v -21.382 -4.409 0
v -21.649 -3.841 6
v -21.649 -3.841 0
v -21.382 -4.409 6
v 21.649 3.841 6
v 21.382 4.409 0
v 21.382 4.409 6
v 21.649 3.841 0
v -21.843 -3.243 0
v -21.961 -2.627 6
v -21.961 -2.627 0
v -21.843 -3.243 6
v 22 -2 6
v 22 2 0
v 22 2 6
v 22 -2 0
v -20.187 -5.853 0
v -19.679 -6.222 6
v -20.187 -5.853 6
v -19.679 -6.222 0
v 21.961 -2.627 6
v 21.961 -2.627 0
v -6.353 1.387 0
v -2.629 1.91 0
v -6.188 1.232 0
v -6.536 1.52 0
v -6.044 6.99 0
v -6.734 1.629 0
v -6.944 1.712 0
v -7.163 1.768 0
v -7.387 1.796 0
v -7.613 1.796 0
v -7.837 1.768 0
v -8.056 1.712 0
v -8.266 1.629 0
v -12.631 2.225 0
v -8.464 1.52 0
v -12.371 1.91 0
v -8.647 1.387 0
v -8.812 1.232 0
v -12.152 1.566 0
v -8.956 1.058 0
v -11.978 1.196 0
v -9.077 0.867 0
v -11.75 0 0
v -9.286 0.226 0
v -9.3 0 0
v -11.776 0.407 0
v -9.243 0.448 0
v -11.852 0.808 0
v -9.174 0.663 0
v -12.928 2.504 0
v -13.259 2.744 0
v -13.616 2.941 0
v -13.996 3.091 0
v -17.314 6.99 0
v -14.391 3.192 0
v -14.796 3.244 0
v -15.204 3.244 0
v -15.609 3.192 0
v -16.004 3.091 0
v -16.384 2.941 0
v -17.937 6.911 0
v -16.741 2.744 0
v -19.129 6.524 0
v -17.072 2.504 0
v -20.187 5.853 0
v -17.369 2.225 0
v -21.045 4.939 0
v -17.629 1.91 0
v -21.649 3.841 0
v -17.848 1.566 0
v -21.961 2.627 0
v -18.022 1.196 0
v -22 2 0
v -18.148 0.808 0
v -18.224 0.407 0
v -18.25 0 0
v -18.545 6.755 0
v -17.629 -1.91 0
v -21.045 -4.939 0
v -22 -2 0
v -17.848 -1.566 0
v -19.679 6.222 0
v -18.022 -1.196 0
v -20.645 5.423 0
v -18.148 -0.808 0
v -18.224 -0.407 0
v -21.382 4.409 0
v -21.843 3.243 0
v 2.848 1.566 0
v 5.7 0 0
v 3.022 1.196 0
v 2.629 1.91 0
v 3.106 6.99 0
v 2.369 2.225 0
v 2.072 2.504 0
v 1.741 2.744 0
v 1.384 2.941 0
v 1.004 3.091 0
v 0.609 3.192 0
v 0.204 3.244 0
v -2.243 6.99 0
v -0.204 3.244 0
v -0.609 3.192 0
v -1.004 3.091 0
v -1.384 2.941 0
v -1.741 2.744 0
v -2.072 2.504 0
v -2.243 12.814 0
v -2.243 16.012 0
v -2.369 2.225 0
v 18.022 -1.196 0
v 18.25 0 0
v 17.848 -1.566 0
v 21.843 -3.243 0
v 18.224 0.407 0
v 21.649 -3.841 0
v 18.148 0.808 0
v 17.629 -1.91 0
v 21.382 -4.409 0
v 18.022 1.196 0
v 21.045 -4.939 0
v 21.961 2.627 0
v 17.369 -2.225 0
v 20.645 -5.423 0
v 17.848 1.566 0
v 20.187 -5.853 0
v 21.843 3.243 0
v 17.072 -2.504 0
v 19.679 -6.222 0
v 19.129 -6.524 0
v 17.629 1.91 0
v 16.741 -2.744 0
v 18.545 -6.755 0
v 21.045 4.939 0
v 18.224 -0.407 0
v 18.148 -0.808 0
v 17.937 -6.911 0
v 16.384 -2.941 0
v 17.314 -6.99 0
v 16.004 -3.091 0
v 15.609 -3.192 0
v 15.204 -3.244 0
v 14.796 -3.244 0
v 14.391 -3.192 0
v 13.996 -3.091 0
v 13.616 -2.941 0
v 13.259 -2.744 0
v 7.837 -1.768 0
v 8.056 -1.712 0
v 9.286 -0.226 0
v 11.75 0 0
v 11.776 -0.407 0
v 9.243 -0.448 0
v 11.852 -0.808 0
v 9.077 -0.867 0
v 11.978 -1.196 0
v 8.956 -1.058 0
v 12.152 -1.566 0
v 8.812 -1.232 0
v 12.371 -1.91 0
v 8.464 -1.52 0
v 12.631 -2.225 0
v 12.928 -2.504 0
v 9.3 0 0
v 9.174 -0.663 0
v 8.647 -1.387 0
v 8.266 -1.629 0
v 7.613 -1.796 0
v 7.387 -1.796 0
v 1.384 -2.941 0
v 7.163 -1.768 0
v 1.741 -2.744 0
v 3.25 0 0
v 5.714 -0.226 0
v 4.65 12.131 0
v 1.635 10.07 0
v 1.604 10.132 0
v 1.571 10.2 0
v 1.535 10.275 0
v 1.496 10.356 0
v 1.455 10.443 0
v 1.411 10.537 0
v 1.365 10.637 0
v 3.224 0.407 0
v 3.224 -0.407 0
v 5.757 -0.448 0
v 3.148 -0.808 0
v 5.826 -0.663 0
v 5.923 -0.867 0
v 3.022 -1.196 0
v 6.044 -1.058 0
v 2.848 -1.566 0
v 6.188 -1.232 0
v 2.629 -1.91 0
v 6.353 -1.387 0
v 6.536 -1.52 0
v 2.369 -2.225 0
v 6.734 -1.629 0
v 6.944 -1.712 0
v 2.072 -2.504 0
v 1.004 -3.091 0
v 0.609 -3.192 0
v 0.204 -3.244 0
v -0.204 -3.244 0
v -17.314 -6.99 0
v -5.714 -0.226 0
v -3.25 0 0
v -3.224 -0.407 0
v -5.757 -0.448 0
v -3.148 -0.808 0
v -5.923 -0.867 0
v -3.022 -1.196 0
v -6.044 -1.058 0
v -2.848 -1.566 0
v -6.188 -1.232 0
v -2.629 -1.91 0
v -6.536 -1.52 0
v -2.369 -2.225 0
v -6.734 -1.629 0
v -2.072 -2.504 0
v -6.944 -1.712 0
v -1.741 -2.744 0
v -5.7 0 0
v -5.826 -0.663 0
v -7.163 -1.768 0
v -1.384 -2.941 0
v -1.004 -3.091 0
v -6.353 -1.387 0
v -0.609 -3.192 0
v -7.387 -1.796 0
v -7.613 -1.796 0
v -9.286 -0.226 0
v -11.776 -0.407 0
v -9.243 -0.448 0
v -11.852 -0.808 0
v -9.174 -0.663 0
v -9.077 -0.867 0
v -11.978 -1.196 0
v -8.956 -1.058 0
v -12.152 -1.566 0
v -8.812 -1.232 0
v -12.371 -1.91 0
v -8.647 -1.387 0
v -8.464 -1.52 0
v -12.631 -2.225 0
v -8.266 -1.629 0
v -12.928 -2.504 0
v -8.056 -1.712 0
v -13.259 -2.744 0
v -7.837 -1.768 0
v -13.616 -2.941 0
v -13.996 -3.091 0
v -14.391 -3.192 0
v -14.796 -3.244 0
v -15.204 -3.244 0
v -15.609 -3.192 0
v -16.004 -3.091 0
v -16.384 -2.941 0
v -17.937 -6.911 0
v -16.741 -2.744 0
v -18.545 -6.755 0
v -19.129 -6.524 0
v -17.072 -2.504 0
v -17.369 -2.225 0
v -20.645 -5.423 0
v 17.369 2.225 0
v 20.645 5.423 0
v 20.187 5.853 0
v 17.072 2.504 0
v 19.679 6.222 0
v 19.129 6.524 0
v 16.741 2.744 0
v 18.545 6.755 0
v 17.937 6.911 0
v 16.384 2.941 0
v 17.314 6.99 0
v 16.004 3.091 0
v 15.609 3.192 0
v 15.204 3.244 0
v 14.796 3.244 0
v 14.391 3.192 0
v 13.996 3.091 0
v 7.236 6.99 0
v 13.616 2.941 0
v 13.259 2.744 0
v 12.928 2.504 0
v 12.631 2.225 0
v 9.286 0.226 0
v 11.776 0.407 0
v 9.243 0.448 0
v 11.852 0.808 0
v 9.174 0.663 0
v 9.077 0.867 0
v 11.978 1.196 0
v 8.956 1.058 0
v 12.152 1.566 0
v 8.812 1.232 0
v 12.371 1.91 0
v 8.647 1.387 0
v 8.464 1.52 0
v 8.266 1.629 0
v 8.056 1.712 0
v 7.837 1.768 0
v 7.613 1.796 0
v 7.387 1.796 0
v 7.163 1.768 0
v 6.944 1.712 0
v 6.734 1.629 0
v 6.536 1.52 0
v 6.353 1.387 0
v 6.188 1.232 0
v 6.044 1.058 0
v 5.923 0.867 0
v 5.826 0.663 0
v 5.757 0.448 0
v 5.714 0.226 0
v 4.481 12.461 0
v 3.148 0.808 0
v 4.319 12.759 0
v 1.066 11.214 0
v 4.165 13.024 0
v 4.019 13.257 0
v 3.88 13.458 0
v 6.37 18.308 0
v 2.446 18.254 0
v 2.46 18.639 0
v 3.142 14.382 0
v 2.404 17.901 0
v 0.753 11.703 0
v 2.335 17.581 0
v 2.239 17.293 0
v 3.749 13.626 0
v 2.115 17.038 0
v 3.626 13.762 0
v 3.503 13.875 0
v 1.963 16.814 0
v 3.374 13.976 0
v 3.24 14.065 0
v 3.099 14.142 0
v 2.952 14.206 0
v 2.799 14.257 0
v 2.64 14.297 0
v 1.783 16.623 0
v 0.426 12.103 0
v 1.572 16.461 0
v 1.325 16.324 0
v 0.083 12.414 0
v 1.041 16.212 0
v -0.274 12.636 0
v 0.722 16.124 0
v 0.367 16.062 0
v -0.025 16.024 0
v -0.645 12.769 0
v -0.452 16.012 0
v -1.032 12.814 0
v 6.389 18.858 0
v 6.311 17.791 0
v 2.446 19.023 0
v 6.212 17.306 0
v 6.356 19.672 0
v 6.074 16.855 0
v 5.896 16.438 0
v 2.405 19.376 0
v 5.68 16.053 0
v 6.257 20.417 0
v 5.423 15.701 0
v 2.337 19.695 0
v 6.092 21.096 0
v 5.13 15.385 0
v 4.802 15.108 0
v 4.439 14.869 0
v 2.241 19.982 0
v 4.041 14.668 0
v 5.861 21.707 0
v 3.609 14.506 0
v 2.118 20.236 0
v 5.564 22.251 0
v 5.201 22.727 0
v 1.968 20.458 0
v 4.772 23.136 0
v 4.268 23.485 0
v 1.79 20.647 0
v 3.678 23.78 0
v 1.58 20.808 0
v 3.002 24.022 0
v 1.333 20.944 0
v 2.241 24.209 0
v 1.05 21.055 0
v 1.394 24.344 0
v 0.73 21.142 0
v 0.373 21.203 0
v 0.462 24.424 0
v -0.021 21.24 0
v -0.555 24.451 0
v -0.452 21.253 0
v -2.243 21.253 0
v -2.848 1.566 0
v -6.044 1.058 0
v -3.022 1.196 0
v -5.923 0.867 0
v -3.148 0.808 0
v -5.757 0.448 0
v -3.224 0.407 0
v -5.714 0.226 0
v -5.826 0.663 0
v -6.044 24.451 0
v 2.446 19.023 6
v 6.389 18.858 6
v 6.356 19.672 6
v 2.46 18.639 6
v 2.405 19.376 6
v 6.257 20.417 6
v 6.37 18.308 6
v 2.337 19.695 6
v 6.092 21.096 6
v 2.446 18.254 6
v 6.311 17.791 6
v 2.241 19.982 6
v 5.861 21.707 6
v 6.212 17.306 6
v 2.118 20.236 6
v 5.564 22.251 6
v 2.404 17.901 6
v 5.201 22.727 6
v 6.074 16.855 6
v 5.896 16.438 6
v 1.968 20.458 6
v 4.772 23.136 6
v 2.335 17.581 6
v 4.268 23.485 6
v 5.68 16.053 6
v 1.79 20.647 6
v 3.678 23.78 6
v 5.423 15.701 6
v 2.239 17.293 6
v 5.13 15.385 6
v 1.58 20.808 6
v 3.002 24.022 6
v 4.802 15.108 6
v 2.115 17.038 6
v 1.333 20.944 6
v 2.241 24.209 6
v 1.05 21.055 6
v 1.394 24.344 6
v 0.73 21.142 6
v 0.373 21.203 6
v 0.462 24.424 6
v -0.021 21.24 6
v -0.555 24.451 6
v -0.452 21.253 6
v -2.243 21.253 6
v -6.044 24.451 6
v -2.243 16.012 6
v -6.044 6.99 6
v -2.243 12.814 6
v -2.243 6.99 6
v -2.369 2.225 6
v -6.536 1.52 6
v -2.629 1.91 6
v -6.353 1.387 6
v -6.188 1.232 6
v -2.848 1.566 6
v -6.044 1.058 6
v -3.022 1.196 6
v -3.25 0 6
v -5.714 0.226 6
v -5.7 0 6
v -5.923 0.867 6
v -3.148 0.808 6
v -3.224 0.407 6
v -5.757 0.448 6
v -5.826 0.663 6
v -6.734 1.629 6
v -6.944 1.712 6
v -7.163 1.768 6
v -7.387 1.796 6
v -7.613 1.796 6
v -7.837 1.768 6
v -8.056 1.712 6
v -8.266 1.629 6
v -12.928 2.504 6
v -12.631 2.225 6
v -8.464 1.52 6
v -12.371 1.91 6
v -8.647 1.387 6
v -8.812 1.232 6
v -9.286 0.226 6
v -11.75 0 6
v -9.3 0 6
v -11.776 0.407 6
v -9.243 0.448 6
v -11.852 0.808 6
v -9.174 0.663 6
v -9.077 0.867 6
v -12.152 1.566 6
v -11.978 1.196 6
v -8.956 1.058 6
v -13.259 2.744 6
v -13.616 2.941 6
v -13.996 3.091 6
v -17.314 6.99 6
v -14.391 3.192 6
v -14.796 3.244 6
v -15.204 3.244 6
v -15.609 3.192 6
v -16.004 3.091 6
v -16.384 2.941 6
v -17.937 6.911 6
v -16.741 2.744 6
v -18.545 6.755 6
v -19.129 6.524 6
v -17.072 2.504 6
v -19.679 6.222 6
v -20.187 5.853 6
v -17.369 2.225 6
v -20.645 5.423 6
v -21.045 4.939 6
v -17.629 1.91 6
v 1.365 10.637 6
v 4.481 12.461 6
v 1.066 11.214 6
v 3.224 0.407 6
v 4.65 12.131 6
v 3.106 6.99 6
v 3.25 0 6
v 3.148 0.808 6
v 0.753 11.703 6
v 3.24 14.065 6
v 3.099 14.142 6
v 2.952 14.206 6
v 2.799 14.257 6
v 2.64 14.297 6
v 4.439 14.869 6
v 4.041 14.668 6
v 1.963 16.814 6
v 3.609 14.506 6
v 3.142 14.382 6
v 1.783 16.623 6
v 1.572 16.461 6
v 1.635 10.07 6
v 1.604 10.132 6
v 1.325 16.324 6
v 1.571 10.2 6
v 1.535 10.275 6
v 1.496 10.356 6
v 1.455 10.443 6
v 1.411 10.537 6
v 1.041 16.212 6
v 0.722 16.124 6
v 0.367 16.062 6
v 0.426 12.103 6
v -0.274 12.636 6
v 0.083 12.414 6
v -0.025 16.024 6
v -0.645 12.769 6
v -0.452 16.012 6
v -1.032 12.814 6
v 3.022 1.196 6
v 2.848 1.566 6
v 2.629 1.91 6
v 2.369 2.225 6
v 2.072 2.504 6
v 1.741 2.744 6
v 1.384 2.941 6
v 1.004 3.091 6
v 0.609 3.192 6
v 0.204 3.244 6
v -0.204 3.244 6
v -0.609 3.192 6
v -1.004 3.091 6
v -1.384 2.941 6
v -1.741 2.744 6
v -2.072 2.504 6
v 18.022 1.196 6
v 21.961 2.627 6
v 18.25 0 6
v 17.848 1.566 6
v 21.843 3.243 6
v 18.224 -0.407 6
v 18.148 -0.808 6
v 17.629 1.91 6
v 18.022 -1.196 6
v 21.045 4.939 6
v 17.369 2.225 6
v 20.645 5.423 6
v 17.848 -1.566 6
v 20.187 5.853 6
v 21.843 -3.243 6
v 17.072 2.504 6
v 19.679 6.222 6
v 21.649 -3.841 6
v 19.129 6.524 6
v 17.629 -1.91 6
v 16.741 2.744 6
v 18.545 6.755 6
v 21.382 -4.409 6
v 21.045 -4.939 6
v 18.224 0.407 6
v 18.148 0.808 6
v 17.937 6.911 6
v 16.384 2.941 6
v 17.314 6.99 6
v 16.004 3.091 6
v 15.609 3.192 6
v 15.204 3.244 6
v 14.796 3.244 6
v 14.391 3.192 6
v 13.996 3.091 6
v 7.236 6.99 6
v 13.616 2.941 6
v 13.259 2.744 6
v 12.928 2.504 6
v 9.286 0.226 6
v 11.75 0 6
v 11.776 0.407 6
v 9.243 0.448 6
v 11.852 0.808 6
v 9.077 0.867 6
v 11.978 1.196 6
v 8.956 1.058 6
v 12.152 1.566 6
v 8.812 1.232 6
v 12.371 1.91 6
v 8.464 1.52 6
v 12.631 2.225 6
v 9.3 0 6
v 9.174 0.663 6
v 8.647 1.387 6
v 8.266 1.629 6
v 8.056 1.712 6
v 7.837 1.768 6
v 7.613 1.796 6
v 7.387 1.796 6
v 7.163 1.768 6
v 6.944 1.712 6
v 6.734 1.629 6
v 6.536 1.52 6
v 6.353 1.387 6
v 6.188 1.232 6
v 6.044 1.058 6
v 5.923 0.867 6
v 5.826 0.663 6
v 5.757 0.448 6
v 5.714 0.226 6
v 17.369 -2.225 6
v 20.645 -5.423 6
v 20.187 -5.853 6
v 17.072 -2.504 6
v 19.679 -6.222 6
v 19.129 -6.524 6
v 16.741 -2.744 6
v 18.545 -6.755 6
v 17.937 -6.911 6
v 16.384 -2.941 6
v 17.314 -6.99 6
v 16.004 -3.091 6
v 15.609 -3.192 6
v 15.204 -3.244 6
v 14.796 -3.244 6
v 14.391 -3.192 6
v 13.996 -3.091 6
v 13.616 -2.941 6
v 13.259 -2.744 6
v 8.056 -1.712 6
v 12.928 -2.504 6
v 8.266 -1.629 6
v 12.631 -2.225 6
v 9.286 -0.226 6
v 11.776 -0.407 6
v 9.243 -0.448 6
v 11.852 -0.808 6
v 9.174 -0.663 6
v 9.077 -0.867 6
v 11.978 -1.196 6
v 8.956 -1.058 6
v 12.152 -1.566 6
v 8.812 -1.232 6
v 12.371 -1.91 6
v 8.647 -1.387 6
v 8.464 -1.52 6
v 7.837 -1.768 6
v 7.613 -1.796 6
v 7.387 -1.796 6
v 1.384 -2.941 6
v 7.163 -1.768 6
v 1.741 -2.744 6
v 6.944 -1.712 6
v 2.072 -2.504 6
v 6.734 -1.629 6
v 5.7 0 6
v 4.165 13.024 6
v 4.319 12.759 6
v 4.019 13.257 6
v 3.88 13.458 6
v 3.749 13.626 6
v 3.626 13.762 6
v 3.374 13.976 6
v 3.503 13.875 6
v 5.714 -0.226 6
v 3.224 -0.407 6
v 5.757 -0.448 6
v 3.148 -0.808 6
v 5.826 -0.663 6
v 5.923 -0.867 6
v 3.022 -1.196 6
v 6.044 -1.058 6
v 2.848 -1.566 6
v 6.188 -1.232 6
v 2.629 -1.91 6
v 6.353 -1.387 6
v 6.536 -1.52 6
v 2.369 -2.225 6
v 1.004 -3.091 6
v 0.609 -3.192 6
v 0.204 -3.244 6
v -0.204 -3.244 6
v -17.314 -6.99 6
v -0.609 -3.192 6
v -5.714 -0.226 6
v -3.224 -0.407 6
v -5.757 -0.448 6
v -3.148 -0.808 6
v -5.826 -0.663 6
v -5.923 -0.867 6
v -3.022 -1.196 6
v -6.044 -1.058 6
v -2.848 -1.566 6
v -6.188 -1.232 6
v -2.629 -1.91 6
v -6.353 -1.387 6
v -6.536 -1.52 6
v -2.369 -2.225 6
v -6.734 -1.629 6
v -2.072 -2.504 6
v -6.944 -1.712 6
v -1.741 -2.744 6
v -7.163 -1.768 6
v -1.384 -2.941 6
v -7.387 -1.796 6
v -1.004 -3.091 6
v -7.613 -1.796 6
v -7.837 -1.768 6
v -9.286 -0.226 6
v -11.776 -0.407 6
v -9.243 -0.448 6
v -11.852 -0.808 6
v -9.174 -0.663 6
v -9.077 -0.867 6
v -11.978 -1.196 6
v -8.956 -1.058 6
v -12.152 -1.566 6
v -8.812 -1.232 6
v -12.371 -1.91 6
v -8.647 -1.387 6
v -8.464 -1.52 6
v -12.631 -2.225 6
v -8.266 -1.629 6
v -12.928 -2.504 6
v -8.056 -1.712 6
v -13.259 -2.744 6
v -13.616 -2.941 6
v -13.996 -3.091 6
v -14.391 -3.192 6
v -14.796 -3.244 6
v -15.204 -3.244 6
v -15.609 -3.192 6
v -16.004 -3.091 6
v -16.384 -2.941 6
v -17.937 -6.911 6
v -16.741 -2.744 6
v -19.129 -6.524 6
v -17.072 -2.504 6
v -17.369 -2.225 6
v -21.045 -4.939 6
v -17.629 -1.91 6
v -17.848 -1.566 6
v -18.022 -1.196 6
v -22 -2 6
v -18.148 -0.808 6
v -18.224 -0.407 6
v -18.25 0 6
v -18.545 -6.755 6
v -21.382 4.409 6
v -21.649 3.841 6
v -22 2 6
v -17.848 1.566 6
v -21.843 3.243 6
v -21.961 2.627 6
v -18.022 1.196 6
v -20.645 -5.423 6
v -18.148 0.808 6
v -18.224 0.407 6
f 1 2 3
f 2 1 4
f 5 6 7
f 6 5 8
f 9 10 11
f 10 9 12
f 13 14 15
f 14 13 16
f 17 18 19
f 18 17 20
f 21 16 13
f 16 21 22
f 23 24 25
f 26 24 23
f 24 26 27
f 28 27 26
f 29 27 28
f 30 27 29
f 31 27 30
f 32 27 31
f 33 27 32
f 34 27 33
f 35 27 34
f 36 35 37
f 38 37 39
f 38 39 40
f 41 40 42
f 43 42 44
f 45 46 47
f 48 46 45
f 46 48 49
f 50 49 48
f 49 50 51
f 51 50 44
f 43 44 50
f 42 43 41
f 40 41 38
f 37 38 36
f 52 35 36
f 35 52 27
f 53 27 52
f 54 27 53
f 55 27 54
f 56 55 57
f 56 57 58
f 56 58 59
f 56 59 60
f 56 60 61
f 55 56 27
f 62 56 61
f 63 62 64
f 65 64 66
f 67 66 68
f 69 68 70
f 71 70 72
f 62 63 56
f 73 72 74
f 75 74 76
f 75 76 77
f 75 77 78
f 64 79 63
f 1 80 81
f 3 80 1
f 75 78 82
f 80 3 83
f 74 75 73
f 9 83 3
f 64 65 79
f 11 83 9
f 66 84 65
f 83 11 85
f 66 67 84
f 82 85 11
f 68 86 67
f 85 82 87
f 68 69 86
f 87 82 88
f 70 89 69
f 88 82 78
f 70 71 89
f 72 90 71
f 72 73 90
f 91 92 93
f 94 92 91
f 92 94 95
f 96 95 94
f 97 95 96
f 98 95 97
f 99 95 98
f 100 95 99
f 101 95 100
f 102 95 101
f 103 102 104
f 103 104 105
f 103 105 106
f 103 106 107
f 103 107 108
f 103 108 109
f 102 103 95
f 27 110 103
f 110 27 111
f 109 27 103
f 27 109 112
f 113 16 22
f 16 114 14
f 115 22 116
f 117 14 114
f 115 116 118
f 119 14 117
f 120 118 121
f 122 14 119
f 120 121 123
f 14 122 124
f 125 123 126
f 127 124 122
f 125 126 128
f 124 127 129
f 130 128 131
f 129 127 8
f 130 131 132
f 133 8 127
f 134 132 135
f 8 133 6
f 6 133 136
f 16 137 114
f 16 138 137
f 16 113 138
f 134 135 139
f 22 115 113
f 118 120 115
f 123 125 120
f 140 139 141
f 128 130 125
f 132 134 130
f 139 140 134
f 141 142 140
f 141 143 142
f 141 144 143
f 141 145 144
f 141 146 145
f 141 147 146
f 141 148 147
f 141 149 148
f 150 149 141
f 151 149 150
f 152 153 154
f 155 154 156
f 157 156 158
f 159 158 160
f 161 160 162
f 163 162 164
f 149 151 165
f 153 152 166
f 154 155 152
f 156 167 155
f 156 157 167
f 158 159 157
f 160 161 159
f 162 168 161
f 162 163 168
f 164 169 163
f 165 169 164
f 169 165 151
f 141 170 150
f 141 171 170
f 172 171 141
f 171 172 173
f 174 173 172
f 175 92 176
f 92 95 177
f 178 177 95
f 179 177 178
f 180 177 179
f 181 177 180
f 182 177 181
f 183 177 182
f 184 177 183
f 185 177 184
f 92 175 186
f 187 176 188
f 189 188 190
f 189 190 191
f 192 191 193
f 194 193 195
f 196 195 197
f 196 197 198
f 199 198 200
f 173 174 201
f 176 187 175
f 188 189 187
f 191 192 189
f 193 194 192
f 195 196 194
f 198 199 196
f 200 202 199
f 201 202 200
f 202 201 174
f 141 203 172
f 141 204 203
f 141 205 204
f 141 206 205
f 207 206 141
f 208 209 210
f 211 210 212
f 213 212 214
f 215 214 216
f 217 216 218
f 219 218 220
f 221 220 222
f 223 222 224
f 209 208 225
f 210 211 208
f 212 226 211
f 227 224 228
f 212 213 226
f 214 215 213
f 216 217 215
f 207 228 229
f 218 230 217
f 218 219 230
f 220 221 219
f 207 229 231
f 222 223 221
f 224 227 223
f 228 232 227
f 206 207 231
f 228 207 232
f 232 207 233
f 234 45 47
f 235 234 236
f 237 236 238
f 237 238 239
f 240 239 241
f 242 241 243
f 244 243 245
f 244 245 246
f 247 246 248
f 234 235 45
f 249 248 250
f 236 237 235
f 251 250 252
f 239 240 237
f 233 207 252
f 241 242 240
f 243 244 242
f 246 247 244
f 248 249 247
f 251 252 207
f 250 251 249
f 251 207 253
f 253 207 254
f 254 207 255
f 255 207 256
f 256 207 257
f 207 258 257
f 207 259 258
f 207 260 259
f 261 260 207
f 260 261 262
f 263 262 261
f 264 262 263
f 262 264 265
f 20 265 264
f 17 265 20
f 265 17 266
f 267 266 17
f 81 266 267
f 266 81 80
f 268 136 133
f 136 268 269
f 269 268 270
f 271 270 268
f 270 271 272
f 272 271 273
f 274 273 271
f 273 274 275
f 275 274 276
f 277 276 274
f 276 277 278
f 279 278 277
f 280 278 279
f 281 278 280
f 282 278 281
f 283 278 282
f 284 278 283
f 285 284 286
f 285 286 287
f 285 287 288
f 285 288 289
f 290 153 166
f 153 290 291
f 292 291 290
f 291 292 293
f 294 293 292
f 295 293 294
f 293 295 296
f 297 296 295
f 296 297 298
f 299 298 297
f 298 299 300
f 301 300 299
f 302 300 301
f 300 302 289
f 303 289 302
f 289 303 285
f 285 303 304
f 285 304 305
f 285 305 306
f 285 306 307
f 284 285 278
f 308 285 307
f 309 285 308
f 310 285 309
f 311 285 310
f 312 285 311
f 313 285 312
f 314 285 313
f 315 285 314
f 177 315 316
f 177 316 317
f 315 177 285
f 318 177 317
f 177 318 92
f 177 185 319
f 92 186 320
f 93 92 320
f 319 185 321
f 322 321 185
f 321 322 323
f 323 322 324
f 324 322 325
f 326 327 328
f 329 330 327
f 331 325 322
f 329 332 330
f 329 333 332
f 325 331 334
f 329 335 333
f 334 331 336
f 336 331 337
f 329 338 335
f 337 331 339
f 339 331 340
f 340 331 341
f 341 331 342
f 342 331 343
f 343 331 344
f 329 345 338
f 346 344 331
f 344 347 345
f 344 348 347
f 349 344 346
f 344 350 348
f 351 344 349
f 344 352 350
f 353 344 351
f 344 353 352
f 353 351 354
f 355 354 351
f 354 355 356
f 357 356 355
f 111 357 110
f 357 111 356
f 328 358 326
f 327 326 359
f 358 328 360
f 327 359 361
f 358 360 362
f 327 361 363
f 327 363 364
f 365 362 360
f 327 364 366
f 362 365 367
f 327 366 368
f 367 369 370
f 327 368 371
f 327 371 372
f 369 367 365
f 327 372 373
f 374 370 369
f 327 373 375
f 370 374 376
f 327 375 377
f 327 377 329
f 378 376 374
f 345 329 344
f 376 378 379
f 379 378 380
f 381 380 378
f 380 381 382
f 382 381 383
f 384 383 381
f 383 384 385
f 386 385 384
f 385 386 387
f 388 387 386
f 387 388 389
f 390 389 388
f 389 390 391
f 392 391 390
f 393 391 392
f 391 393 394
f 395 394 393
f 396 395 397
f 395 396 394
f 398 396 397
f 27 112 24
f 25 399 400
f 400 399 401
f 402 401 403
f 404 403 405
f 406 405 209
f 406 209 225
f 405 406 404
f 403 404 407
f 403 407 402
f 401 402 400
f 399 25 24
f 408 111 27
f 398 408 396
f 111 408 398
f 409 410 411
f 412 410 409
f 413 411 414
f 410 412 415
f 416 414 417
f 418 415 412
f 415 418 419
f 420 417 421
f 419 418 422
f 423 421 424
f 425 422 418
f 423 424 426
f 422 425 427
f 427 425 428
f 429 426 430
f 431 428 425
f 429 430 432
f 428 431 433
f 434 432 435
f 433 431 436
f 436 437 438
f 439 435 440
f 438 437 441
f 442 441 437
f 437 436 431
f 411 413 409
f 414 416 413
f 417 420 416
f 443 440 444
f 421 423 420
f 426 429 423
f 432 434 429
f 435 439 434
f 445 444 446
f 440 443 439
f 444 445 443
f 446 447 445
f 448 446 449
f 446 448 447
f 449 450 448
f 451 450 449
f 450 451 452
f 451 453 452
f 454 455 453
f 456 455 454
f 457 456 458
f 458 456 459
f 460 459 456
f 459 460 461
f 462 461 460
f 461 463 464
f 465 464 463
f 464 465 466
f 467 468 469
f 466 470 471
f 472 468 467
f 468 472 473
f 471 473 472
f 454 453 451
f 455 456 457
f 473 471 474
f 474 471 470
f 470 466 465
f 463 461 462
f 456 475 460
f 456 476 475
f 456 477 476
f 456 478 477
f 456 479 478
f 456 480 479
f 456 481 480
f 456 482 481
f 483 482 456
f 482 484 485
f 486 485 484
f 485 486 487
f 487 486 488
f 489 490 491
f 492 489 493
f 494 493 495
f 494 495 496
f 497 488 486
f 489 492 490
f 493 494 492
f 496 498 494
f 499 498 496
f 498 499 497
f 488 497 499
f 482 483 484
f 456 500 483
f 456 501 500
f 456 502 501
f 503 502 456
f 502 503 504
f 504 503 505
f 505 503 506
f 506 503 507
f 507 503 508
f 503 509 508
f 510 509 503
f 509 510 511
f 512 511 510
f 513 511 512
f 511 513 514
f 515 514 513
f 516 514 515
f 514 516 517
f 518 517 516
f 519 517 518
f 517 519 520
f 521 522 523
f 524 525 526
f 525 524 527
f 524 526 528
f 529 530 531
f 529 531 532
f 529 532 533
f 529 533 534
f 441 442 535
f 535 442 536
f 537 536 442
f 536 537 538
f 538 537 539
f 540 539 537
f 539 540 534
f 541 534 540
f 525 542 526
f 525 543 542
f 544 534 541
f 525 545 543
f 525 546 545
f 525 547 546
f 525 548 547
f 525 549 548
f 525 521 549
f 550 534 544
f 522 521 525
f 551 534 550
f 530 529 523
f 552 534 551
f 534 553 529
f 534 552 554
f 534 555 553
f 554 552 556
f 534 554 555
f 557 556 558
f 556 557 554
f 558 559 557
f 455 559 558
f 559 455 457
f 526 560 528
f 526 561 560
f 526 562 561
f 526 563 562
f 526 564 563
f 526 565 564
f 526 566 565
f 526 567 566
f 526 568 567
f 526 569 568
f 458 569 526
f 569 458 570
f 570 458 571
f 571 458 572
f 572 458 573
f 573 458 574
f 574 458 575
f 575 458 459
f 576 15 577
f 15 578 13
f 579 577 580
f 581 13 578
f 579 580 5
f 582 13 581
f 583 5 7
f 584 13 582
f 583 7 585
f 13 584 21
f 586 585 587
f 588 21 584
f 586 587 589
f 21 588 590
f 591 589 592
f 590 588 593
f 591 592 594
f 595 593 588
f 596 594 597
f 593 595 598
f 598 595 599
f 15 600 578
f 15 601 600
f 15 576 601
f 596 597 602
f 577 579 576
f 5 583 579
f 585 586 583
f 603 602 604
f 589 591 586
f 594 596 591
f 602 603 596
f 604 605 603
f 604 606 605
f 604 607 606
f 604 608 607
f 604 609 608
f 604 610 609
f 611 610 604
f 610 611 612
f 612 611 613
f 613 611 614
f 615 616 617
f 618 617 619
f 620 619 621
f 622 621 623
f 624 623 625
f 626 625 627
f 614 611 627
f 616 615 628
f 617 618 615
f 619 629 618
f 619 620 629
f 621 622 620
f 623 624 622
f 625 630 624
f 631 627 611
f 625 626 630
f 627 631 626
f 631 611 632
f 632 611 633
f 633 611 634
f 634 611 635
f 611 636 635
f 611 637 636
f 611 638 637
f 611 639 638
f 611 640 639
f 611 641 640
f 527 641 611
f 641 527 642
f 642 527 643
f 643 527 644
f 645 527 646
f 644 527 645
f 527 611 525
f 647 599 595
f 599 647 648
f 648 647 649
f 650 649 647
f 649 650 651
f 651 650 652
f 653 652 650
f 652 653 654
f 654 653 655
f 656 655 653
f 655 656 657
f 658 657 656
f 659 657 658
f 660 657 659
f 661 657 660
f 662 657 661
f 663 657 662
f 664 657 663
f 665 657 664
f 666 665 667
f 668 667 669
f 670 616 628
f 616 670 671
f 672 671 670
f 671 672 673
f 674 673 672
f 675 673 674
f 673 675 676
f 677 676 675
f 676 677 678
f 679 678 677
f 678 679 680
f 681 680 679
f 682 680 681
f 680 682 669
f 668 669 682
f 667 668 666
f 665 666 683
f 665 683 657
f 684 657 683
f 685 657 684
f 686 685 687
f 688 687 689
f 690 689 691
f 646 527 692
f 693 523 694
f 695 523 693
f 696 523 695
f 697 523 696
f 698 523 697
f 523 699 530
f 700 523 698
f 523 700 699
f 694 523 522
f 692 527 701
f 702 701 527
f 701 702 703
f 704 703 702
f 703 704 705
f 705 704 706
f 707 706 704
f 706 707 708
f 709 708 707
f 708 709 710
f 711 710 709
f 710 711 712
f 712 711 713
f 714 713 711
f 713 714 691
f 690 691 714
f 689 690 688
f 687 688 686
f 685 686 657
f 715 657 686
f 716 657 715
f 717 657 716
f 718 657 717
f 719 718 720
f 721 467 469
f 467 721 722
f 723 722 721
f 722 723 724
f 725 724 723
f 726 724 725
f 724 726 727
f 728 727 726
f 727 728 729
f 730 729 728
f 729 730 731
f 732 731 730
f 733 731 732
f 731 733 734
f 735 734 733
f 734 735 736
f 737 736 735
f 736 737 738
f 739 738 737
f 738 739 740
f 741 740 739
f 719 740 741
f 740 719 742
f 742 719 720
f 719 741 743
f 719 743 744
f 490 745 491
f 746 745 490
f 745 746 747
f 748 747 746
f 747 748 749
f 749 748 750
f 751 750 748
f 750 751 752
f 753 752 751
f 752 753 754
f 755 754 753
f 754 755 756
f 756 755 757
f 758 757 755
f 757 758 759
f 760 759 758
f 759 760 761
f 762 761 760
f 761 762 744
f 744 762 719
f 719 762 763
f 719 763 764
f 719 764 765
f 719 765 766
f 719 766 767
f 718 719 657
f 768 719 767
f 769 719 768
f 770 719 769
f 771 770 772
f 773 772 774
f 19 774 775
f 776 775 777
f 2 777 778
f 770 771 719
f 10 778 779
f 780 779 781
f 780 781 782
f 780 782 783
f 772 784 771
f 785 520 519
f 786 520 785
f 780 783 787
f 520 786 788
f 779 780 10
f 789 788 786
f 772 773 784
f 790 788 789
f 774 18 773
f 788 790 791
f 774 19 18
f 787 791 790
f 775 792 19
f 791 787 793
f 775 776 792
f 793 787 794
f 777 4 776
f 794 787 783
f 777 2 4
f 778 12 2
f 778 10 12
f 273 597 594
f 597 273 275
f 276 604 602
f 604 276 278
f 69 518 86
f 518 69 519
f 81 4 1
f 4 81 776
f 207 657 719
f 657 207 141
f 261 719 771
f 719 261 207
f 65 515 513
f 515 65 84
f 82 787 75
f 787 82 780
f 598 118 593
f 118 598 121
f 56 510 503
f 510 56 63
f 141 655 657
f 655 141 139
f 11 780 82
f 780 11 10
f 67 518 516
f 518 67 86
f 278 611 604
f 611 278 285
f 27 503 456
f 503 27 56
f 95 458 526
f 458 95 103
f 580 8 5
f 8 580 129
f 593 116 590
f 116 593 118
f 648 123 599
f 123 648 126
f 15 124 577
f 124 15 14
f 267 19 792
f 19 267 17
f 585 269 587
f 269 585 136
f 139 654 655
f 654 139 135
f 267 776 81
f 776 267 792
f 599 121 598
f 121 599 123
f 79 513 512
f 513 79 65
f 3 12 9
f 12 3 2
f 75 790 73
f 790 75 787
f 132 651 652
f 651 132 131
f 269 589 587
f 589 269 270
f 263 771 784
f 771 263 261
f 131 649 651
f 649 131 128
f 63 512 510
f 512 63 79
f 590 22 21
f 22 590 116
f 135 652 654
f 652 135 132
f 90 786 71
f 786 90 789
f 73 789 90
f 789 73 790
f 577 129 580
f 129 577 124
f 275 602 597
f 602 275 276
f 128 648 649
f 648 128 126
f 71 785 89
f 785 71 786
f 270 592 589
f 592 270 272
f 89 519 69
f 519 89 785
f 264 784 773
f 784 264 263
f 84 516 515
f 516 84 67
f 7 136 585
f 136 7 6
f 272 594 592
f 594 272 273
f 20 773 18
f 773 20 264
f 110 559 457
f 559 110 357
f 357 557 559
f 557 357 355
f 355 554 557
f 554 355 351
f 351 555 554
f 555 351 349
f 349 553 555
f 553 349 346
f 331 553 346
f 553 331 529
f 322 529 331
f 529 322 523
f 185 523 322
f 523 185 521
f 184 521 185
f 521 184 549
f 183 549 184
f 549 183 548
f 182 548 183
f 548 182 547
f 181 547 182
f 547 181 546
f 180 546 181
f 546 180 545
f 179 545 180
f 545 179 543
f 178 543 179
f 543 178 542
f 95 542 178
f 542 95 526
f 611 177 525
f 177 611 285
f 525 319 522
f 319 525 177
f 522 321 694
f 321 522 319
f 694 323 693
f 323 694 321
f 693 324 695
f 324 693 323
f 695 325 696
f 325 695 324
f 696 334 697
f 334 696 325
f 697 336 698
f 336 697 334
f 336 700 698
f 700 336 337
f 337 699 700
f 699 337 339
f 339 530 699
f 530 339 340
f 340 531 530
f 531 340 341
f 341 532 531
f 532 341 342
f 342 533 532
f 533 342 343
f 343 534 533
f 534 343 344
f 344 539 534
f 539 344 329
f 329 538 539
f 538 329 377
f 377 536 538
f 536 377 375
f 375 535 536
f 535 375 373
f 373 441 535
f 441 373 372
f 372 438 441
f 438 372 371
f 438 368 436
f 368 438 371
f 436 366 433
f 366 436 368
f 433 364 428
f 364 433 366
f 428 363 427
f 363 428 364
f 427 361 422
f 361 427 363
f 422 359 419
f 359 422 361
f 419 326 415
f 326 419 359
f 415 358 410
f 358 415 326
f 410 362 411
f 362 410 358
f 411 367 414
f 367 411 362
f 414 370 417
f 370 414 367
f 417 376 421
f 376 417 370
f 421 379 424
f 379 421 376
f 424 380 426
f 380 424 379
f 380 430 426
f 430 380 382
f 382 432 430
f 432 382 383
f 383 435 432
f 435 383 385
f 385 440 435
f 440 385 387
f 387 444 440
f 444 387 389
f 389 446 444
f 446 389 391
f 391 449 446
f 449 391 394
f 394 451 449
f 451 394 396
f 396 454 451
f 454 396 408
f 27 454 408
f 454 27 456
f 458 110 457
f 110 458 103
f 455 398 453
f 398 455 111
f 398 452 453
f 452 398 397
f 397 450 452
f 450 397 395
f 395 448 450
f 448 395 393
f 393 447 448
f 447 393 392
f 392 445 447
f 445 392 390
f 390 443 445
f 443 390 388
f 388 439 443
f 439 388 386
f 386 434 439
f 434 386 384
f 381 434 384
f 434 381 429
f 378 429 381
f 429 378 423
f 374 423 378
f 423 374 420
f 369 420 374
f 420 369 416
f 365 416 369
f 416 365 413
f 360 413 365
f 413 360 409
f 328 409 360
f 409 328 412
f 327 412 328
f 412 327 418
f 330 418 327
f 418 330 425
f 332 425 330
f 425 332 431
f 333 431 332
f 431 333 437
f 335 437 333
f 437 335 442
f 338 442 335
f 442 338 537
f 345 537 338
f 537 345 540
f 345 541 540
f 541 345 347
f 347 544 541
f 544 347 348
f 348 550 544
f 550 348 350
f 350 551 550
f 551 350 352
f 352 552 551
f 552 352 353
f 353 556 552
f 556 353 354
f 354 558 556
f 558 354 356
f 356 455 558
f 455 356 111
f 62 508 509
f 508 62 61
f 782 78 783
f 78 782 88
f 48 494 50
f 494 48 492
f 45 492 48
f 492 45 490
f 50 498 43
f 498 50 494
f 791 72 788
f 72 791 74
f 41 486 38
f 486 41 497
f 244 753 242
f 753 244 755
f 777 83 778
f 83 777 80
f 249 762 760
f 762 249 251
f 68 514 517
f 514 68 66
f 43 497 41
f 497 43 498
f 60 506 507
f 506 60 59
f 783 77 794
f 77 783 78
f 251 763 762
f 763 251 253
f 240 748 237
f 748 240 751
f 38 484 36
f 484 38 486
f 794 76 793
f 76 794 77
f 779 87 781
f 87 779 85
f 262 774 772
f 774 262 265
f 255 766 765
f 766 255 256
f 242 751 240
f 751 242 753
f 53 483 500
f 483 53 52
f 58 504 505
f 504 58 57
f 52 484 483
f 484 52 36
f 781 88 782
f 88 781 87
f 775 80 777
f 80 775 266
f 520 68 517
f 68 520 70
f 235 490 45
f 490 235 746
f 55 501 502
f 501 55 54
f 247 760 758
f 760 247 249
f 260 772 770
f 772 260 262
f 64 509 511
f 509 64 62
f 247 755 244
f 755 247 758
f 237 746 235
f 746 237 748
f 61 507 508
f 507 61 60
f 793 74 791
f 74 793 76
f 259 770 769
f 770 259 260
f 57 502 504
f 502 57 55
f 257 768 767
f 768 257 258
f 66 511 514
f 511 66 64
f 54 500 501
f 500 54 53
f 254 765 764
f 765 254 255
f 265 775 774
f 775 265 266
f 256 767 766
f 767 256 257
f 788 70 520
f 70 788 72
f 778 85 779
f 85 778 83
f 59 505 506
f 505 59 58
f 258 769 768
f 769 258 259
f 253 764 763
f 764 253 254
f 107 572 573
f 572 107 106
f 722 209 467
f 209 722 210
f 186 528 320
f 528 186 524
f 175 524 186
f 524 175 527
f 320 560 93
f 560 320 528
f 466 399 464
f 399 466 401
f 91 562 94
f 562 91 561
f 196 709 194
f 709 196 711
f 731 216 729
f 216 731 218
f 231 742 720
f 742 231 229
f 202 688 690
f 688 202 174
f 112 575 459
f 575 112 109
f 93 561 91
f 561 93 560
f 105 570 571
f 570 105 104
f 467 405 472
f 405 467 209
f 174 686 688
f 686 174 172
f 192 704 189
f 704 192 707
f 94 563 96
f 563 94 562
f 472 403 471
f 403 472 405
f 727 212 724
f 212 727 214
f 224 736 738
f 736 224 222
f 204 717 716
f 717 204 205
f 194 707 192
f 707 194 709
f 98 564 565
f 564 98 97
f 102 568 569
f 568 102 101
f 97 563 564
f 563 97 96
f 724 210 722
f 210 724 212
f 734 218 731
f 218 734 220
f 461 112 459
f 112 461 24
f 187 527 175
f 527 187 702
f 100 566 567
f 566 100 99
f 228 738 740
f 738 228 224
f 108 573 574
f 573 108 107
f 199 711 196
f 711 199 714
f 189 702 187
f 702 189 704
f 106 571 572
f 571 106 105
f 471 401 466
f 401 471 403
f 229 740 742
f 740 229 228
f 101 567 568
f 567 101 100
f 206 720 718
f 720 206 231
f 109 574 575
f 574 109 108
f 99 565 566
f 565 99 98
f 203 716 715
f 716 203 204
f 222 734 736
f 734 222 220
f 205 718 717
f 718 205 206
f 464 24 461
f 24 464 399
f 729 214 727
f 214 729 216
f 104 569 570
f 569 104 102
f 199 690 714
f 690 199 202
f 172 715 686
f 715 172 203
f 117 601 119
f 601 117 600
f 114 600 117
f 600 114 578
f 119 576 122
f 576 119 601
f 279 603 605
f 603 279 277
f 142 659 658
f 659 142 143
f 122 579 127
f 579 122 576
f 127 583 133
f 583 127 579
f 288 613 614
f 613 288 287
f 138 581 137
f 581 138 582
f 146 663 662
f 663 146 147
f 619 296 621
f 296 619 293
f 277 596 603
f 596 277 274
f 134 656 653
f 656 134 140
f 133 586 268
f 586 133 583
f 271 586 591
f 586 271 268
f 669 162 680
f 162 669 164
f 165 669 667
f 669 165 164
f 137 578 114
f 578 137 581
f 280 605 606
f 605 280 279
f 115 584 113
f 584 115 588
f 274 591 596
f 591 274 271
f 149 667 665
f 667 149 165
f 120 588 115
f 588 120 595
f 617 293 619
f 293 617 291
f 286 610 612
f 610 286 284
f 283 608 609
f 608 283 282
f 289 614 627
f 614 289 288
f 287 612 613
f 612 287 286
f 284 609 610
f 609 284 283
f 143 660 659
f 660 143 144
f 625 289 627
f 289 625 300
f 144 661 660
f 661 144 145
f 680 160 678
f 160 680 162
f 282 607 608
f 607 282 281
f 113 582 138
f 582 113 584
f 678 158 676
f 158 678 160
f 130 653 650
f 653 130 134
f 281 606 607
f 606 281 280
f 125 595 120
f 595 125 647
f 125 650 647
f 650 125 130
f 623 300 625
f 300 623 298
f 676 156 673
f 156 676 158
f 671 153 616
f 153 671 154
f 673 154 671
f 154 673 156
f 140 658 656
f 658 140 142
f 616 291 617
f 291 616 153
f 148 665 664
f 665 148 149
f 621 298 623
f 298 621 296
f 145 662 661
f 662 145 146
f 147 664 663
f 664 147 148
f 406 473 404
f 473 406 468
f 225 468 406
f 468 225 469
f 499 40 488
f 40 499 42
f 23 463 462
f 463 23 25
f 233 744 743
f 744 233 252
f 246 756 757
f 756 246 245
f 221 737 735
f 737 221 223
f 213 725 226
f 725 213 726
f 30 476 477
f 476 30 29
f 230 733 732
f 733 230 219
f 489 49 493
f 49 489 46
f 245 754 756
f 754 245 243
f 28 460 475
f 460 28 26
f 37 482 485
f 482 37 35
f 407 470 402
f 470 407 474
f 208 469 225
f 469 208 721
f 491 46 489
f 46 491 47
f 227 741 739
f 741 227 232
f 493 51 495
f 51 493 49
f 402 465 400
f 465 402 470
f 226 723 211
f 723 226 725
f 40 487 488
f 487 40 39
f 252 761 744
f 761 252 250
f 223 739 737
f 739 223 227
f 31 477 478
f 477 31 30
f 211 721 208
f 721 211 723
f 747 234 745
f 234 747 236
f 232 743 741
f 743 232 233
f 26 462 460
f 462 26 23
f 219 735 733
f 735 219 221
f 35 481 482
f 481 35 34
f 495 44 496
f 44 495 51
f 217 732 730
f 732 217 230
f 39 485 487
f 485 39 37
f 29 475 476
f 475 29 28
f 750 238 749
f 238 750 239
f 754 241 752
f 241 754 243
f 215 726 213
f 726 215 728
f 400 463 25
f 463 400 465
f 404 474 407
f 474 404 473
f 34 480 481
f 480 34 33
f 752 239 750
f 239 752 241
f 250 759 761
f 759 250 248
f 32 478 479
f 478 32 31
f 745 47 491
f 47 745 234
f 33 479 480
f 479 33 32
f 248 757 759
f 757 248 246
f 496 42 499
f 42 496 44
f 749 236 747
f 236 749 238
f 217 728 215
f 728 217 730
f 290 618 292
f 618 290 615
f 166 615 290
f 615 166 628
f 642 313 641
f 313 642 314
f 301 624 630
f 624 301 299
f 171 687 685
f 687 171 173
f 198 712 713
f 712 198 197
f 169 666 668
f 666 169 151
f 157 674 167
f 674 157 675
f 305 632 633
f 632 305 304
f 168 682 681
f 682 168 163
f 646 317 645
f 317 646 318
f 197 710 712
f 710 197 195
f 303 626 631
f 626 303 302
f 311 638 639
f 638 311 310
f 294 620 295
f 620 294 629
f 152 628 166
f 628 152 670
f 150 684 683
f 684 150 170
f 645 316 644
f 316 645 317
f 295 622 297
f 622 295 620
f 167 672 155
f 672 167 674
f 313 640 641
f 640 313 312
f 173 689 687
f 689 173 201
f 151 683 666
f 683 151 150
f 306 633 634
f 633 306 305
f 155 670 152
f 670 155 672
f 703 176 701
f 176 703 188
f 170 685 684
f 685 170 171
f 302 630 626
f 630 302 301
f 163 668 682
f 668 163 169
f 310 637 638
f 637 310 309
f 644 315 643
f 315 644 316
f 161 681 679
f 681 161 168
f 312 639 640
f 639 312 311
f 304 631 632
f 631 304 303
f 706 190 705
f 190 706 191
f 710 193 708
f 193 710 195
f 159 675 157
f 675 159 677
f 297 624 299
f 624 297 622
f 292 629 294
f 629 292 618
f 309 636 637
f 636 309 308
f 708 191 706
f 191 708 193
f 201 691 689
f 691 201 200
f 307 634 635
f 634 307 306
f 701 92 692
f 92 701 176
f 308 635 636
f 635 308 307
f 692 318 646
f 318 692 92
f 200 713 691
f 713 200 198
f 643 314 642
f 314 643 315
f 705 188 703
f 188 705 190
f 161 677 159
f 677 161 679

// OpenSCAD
$fn = 50;


difference() {
	union() {
		hull() {
			translate(v = [-17.0000000000, 2.0000000000, 0]) {
				cylinder(h = 6, r = 5);
			}
			translate(v = [17.0000000000, 2.0000000000, 0]) {
				cylinder(h = 6, r = 5);
			}
			translate(v = [-17.0000000000, -2.0000000000, 0]) {
				cylinder(h = 6, r = 5);
			}
			translate(v = [17.0000000000, -2.0000000000, 0]) {
				cylinder(h = 6, r = 5);
			}
		}
		translate(v = [0, 24, 0]) {
			linear_extrude(height = 6) {
				text(font = "DejaVu Sans Mono:style=Bold", halign = "center", size = 19.0000000000, text = "R", valign = "top");
			}
		}
	}
	union() {
		translate(v = [-15.0000000000, 0.0000000000, 0]) {
			translate(v = [0, 0, -100]) {
				cylinder(h = 200, r = 3.2500000000);
			}
		}
		translate(v = [0, 0, -100]) {
			cylinder(h = 200, r = 3.2500000000);
		}
		translate(v = [15.0000000000, 0.0000000000, 0]) {
			translate(v = [0, 0, -100]) {
				cylinder(h = 200, r = 3.2500000000);
			}
		}
		translate(v = [-15.0000000000, 0.0000000000, 0]) {
			translate(v = [0, 0, -100]) {
				cylinder(h = 200, r = 1.8000000000);
			}
		}
		translate(v = [-7.5000000000, 0.0000000000, 0]) {
			translate(v = [0, 0, -100]) {
				cylinder(h = 200, r = 1.8000000000);
			}
		}
		translate(v = [0, 0, -100]) {
			cylinder(h = 200, r = 1.8000000000);
		}
		translate(v = [7.5000000000, 0.0000000000, 0]) {
			translate(v = [0, 0, -100]) {
				cylinder(h = 200, r = 1.8000000000);
			}
		}
		translate(v = [15.0000000000, 0.0000000000, 0]) {
			translate(v = [0, 0, -100]) {
				cylinder(h = 200, r = 1.8000000000);
			}
		}
	}
}
